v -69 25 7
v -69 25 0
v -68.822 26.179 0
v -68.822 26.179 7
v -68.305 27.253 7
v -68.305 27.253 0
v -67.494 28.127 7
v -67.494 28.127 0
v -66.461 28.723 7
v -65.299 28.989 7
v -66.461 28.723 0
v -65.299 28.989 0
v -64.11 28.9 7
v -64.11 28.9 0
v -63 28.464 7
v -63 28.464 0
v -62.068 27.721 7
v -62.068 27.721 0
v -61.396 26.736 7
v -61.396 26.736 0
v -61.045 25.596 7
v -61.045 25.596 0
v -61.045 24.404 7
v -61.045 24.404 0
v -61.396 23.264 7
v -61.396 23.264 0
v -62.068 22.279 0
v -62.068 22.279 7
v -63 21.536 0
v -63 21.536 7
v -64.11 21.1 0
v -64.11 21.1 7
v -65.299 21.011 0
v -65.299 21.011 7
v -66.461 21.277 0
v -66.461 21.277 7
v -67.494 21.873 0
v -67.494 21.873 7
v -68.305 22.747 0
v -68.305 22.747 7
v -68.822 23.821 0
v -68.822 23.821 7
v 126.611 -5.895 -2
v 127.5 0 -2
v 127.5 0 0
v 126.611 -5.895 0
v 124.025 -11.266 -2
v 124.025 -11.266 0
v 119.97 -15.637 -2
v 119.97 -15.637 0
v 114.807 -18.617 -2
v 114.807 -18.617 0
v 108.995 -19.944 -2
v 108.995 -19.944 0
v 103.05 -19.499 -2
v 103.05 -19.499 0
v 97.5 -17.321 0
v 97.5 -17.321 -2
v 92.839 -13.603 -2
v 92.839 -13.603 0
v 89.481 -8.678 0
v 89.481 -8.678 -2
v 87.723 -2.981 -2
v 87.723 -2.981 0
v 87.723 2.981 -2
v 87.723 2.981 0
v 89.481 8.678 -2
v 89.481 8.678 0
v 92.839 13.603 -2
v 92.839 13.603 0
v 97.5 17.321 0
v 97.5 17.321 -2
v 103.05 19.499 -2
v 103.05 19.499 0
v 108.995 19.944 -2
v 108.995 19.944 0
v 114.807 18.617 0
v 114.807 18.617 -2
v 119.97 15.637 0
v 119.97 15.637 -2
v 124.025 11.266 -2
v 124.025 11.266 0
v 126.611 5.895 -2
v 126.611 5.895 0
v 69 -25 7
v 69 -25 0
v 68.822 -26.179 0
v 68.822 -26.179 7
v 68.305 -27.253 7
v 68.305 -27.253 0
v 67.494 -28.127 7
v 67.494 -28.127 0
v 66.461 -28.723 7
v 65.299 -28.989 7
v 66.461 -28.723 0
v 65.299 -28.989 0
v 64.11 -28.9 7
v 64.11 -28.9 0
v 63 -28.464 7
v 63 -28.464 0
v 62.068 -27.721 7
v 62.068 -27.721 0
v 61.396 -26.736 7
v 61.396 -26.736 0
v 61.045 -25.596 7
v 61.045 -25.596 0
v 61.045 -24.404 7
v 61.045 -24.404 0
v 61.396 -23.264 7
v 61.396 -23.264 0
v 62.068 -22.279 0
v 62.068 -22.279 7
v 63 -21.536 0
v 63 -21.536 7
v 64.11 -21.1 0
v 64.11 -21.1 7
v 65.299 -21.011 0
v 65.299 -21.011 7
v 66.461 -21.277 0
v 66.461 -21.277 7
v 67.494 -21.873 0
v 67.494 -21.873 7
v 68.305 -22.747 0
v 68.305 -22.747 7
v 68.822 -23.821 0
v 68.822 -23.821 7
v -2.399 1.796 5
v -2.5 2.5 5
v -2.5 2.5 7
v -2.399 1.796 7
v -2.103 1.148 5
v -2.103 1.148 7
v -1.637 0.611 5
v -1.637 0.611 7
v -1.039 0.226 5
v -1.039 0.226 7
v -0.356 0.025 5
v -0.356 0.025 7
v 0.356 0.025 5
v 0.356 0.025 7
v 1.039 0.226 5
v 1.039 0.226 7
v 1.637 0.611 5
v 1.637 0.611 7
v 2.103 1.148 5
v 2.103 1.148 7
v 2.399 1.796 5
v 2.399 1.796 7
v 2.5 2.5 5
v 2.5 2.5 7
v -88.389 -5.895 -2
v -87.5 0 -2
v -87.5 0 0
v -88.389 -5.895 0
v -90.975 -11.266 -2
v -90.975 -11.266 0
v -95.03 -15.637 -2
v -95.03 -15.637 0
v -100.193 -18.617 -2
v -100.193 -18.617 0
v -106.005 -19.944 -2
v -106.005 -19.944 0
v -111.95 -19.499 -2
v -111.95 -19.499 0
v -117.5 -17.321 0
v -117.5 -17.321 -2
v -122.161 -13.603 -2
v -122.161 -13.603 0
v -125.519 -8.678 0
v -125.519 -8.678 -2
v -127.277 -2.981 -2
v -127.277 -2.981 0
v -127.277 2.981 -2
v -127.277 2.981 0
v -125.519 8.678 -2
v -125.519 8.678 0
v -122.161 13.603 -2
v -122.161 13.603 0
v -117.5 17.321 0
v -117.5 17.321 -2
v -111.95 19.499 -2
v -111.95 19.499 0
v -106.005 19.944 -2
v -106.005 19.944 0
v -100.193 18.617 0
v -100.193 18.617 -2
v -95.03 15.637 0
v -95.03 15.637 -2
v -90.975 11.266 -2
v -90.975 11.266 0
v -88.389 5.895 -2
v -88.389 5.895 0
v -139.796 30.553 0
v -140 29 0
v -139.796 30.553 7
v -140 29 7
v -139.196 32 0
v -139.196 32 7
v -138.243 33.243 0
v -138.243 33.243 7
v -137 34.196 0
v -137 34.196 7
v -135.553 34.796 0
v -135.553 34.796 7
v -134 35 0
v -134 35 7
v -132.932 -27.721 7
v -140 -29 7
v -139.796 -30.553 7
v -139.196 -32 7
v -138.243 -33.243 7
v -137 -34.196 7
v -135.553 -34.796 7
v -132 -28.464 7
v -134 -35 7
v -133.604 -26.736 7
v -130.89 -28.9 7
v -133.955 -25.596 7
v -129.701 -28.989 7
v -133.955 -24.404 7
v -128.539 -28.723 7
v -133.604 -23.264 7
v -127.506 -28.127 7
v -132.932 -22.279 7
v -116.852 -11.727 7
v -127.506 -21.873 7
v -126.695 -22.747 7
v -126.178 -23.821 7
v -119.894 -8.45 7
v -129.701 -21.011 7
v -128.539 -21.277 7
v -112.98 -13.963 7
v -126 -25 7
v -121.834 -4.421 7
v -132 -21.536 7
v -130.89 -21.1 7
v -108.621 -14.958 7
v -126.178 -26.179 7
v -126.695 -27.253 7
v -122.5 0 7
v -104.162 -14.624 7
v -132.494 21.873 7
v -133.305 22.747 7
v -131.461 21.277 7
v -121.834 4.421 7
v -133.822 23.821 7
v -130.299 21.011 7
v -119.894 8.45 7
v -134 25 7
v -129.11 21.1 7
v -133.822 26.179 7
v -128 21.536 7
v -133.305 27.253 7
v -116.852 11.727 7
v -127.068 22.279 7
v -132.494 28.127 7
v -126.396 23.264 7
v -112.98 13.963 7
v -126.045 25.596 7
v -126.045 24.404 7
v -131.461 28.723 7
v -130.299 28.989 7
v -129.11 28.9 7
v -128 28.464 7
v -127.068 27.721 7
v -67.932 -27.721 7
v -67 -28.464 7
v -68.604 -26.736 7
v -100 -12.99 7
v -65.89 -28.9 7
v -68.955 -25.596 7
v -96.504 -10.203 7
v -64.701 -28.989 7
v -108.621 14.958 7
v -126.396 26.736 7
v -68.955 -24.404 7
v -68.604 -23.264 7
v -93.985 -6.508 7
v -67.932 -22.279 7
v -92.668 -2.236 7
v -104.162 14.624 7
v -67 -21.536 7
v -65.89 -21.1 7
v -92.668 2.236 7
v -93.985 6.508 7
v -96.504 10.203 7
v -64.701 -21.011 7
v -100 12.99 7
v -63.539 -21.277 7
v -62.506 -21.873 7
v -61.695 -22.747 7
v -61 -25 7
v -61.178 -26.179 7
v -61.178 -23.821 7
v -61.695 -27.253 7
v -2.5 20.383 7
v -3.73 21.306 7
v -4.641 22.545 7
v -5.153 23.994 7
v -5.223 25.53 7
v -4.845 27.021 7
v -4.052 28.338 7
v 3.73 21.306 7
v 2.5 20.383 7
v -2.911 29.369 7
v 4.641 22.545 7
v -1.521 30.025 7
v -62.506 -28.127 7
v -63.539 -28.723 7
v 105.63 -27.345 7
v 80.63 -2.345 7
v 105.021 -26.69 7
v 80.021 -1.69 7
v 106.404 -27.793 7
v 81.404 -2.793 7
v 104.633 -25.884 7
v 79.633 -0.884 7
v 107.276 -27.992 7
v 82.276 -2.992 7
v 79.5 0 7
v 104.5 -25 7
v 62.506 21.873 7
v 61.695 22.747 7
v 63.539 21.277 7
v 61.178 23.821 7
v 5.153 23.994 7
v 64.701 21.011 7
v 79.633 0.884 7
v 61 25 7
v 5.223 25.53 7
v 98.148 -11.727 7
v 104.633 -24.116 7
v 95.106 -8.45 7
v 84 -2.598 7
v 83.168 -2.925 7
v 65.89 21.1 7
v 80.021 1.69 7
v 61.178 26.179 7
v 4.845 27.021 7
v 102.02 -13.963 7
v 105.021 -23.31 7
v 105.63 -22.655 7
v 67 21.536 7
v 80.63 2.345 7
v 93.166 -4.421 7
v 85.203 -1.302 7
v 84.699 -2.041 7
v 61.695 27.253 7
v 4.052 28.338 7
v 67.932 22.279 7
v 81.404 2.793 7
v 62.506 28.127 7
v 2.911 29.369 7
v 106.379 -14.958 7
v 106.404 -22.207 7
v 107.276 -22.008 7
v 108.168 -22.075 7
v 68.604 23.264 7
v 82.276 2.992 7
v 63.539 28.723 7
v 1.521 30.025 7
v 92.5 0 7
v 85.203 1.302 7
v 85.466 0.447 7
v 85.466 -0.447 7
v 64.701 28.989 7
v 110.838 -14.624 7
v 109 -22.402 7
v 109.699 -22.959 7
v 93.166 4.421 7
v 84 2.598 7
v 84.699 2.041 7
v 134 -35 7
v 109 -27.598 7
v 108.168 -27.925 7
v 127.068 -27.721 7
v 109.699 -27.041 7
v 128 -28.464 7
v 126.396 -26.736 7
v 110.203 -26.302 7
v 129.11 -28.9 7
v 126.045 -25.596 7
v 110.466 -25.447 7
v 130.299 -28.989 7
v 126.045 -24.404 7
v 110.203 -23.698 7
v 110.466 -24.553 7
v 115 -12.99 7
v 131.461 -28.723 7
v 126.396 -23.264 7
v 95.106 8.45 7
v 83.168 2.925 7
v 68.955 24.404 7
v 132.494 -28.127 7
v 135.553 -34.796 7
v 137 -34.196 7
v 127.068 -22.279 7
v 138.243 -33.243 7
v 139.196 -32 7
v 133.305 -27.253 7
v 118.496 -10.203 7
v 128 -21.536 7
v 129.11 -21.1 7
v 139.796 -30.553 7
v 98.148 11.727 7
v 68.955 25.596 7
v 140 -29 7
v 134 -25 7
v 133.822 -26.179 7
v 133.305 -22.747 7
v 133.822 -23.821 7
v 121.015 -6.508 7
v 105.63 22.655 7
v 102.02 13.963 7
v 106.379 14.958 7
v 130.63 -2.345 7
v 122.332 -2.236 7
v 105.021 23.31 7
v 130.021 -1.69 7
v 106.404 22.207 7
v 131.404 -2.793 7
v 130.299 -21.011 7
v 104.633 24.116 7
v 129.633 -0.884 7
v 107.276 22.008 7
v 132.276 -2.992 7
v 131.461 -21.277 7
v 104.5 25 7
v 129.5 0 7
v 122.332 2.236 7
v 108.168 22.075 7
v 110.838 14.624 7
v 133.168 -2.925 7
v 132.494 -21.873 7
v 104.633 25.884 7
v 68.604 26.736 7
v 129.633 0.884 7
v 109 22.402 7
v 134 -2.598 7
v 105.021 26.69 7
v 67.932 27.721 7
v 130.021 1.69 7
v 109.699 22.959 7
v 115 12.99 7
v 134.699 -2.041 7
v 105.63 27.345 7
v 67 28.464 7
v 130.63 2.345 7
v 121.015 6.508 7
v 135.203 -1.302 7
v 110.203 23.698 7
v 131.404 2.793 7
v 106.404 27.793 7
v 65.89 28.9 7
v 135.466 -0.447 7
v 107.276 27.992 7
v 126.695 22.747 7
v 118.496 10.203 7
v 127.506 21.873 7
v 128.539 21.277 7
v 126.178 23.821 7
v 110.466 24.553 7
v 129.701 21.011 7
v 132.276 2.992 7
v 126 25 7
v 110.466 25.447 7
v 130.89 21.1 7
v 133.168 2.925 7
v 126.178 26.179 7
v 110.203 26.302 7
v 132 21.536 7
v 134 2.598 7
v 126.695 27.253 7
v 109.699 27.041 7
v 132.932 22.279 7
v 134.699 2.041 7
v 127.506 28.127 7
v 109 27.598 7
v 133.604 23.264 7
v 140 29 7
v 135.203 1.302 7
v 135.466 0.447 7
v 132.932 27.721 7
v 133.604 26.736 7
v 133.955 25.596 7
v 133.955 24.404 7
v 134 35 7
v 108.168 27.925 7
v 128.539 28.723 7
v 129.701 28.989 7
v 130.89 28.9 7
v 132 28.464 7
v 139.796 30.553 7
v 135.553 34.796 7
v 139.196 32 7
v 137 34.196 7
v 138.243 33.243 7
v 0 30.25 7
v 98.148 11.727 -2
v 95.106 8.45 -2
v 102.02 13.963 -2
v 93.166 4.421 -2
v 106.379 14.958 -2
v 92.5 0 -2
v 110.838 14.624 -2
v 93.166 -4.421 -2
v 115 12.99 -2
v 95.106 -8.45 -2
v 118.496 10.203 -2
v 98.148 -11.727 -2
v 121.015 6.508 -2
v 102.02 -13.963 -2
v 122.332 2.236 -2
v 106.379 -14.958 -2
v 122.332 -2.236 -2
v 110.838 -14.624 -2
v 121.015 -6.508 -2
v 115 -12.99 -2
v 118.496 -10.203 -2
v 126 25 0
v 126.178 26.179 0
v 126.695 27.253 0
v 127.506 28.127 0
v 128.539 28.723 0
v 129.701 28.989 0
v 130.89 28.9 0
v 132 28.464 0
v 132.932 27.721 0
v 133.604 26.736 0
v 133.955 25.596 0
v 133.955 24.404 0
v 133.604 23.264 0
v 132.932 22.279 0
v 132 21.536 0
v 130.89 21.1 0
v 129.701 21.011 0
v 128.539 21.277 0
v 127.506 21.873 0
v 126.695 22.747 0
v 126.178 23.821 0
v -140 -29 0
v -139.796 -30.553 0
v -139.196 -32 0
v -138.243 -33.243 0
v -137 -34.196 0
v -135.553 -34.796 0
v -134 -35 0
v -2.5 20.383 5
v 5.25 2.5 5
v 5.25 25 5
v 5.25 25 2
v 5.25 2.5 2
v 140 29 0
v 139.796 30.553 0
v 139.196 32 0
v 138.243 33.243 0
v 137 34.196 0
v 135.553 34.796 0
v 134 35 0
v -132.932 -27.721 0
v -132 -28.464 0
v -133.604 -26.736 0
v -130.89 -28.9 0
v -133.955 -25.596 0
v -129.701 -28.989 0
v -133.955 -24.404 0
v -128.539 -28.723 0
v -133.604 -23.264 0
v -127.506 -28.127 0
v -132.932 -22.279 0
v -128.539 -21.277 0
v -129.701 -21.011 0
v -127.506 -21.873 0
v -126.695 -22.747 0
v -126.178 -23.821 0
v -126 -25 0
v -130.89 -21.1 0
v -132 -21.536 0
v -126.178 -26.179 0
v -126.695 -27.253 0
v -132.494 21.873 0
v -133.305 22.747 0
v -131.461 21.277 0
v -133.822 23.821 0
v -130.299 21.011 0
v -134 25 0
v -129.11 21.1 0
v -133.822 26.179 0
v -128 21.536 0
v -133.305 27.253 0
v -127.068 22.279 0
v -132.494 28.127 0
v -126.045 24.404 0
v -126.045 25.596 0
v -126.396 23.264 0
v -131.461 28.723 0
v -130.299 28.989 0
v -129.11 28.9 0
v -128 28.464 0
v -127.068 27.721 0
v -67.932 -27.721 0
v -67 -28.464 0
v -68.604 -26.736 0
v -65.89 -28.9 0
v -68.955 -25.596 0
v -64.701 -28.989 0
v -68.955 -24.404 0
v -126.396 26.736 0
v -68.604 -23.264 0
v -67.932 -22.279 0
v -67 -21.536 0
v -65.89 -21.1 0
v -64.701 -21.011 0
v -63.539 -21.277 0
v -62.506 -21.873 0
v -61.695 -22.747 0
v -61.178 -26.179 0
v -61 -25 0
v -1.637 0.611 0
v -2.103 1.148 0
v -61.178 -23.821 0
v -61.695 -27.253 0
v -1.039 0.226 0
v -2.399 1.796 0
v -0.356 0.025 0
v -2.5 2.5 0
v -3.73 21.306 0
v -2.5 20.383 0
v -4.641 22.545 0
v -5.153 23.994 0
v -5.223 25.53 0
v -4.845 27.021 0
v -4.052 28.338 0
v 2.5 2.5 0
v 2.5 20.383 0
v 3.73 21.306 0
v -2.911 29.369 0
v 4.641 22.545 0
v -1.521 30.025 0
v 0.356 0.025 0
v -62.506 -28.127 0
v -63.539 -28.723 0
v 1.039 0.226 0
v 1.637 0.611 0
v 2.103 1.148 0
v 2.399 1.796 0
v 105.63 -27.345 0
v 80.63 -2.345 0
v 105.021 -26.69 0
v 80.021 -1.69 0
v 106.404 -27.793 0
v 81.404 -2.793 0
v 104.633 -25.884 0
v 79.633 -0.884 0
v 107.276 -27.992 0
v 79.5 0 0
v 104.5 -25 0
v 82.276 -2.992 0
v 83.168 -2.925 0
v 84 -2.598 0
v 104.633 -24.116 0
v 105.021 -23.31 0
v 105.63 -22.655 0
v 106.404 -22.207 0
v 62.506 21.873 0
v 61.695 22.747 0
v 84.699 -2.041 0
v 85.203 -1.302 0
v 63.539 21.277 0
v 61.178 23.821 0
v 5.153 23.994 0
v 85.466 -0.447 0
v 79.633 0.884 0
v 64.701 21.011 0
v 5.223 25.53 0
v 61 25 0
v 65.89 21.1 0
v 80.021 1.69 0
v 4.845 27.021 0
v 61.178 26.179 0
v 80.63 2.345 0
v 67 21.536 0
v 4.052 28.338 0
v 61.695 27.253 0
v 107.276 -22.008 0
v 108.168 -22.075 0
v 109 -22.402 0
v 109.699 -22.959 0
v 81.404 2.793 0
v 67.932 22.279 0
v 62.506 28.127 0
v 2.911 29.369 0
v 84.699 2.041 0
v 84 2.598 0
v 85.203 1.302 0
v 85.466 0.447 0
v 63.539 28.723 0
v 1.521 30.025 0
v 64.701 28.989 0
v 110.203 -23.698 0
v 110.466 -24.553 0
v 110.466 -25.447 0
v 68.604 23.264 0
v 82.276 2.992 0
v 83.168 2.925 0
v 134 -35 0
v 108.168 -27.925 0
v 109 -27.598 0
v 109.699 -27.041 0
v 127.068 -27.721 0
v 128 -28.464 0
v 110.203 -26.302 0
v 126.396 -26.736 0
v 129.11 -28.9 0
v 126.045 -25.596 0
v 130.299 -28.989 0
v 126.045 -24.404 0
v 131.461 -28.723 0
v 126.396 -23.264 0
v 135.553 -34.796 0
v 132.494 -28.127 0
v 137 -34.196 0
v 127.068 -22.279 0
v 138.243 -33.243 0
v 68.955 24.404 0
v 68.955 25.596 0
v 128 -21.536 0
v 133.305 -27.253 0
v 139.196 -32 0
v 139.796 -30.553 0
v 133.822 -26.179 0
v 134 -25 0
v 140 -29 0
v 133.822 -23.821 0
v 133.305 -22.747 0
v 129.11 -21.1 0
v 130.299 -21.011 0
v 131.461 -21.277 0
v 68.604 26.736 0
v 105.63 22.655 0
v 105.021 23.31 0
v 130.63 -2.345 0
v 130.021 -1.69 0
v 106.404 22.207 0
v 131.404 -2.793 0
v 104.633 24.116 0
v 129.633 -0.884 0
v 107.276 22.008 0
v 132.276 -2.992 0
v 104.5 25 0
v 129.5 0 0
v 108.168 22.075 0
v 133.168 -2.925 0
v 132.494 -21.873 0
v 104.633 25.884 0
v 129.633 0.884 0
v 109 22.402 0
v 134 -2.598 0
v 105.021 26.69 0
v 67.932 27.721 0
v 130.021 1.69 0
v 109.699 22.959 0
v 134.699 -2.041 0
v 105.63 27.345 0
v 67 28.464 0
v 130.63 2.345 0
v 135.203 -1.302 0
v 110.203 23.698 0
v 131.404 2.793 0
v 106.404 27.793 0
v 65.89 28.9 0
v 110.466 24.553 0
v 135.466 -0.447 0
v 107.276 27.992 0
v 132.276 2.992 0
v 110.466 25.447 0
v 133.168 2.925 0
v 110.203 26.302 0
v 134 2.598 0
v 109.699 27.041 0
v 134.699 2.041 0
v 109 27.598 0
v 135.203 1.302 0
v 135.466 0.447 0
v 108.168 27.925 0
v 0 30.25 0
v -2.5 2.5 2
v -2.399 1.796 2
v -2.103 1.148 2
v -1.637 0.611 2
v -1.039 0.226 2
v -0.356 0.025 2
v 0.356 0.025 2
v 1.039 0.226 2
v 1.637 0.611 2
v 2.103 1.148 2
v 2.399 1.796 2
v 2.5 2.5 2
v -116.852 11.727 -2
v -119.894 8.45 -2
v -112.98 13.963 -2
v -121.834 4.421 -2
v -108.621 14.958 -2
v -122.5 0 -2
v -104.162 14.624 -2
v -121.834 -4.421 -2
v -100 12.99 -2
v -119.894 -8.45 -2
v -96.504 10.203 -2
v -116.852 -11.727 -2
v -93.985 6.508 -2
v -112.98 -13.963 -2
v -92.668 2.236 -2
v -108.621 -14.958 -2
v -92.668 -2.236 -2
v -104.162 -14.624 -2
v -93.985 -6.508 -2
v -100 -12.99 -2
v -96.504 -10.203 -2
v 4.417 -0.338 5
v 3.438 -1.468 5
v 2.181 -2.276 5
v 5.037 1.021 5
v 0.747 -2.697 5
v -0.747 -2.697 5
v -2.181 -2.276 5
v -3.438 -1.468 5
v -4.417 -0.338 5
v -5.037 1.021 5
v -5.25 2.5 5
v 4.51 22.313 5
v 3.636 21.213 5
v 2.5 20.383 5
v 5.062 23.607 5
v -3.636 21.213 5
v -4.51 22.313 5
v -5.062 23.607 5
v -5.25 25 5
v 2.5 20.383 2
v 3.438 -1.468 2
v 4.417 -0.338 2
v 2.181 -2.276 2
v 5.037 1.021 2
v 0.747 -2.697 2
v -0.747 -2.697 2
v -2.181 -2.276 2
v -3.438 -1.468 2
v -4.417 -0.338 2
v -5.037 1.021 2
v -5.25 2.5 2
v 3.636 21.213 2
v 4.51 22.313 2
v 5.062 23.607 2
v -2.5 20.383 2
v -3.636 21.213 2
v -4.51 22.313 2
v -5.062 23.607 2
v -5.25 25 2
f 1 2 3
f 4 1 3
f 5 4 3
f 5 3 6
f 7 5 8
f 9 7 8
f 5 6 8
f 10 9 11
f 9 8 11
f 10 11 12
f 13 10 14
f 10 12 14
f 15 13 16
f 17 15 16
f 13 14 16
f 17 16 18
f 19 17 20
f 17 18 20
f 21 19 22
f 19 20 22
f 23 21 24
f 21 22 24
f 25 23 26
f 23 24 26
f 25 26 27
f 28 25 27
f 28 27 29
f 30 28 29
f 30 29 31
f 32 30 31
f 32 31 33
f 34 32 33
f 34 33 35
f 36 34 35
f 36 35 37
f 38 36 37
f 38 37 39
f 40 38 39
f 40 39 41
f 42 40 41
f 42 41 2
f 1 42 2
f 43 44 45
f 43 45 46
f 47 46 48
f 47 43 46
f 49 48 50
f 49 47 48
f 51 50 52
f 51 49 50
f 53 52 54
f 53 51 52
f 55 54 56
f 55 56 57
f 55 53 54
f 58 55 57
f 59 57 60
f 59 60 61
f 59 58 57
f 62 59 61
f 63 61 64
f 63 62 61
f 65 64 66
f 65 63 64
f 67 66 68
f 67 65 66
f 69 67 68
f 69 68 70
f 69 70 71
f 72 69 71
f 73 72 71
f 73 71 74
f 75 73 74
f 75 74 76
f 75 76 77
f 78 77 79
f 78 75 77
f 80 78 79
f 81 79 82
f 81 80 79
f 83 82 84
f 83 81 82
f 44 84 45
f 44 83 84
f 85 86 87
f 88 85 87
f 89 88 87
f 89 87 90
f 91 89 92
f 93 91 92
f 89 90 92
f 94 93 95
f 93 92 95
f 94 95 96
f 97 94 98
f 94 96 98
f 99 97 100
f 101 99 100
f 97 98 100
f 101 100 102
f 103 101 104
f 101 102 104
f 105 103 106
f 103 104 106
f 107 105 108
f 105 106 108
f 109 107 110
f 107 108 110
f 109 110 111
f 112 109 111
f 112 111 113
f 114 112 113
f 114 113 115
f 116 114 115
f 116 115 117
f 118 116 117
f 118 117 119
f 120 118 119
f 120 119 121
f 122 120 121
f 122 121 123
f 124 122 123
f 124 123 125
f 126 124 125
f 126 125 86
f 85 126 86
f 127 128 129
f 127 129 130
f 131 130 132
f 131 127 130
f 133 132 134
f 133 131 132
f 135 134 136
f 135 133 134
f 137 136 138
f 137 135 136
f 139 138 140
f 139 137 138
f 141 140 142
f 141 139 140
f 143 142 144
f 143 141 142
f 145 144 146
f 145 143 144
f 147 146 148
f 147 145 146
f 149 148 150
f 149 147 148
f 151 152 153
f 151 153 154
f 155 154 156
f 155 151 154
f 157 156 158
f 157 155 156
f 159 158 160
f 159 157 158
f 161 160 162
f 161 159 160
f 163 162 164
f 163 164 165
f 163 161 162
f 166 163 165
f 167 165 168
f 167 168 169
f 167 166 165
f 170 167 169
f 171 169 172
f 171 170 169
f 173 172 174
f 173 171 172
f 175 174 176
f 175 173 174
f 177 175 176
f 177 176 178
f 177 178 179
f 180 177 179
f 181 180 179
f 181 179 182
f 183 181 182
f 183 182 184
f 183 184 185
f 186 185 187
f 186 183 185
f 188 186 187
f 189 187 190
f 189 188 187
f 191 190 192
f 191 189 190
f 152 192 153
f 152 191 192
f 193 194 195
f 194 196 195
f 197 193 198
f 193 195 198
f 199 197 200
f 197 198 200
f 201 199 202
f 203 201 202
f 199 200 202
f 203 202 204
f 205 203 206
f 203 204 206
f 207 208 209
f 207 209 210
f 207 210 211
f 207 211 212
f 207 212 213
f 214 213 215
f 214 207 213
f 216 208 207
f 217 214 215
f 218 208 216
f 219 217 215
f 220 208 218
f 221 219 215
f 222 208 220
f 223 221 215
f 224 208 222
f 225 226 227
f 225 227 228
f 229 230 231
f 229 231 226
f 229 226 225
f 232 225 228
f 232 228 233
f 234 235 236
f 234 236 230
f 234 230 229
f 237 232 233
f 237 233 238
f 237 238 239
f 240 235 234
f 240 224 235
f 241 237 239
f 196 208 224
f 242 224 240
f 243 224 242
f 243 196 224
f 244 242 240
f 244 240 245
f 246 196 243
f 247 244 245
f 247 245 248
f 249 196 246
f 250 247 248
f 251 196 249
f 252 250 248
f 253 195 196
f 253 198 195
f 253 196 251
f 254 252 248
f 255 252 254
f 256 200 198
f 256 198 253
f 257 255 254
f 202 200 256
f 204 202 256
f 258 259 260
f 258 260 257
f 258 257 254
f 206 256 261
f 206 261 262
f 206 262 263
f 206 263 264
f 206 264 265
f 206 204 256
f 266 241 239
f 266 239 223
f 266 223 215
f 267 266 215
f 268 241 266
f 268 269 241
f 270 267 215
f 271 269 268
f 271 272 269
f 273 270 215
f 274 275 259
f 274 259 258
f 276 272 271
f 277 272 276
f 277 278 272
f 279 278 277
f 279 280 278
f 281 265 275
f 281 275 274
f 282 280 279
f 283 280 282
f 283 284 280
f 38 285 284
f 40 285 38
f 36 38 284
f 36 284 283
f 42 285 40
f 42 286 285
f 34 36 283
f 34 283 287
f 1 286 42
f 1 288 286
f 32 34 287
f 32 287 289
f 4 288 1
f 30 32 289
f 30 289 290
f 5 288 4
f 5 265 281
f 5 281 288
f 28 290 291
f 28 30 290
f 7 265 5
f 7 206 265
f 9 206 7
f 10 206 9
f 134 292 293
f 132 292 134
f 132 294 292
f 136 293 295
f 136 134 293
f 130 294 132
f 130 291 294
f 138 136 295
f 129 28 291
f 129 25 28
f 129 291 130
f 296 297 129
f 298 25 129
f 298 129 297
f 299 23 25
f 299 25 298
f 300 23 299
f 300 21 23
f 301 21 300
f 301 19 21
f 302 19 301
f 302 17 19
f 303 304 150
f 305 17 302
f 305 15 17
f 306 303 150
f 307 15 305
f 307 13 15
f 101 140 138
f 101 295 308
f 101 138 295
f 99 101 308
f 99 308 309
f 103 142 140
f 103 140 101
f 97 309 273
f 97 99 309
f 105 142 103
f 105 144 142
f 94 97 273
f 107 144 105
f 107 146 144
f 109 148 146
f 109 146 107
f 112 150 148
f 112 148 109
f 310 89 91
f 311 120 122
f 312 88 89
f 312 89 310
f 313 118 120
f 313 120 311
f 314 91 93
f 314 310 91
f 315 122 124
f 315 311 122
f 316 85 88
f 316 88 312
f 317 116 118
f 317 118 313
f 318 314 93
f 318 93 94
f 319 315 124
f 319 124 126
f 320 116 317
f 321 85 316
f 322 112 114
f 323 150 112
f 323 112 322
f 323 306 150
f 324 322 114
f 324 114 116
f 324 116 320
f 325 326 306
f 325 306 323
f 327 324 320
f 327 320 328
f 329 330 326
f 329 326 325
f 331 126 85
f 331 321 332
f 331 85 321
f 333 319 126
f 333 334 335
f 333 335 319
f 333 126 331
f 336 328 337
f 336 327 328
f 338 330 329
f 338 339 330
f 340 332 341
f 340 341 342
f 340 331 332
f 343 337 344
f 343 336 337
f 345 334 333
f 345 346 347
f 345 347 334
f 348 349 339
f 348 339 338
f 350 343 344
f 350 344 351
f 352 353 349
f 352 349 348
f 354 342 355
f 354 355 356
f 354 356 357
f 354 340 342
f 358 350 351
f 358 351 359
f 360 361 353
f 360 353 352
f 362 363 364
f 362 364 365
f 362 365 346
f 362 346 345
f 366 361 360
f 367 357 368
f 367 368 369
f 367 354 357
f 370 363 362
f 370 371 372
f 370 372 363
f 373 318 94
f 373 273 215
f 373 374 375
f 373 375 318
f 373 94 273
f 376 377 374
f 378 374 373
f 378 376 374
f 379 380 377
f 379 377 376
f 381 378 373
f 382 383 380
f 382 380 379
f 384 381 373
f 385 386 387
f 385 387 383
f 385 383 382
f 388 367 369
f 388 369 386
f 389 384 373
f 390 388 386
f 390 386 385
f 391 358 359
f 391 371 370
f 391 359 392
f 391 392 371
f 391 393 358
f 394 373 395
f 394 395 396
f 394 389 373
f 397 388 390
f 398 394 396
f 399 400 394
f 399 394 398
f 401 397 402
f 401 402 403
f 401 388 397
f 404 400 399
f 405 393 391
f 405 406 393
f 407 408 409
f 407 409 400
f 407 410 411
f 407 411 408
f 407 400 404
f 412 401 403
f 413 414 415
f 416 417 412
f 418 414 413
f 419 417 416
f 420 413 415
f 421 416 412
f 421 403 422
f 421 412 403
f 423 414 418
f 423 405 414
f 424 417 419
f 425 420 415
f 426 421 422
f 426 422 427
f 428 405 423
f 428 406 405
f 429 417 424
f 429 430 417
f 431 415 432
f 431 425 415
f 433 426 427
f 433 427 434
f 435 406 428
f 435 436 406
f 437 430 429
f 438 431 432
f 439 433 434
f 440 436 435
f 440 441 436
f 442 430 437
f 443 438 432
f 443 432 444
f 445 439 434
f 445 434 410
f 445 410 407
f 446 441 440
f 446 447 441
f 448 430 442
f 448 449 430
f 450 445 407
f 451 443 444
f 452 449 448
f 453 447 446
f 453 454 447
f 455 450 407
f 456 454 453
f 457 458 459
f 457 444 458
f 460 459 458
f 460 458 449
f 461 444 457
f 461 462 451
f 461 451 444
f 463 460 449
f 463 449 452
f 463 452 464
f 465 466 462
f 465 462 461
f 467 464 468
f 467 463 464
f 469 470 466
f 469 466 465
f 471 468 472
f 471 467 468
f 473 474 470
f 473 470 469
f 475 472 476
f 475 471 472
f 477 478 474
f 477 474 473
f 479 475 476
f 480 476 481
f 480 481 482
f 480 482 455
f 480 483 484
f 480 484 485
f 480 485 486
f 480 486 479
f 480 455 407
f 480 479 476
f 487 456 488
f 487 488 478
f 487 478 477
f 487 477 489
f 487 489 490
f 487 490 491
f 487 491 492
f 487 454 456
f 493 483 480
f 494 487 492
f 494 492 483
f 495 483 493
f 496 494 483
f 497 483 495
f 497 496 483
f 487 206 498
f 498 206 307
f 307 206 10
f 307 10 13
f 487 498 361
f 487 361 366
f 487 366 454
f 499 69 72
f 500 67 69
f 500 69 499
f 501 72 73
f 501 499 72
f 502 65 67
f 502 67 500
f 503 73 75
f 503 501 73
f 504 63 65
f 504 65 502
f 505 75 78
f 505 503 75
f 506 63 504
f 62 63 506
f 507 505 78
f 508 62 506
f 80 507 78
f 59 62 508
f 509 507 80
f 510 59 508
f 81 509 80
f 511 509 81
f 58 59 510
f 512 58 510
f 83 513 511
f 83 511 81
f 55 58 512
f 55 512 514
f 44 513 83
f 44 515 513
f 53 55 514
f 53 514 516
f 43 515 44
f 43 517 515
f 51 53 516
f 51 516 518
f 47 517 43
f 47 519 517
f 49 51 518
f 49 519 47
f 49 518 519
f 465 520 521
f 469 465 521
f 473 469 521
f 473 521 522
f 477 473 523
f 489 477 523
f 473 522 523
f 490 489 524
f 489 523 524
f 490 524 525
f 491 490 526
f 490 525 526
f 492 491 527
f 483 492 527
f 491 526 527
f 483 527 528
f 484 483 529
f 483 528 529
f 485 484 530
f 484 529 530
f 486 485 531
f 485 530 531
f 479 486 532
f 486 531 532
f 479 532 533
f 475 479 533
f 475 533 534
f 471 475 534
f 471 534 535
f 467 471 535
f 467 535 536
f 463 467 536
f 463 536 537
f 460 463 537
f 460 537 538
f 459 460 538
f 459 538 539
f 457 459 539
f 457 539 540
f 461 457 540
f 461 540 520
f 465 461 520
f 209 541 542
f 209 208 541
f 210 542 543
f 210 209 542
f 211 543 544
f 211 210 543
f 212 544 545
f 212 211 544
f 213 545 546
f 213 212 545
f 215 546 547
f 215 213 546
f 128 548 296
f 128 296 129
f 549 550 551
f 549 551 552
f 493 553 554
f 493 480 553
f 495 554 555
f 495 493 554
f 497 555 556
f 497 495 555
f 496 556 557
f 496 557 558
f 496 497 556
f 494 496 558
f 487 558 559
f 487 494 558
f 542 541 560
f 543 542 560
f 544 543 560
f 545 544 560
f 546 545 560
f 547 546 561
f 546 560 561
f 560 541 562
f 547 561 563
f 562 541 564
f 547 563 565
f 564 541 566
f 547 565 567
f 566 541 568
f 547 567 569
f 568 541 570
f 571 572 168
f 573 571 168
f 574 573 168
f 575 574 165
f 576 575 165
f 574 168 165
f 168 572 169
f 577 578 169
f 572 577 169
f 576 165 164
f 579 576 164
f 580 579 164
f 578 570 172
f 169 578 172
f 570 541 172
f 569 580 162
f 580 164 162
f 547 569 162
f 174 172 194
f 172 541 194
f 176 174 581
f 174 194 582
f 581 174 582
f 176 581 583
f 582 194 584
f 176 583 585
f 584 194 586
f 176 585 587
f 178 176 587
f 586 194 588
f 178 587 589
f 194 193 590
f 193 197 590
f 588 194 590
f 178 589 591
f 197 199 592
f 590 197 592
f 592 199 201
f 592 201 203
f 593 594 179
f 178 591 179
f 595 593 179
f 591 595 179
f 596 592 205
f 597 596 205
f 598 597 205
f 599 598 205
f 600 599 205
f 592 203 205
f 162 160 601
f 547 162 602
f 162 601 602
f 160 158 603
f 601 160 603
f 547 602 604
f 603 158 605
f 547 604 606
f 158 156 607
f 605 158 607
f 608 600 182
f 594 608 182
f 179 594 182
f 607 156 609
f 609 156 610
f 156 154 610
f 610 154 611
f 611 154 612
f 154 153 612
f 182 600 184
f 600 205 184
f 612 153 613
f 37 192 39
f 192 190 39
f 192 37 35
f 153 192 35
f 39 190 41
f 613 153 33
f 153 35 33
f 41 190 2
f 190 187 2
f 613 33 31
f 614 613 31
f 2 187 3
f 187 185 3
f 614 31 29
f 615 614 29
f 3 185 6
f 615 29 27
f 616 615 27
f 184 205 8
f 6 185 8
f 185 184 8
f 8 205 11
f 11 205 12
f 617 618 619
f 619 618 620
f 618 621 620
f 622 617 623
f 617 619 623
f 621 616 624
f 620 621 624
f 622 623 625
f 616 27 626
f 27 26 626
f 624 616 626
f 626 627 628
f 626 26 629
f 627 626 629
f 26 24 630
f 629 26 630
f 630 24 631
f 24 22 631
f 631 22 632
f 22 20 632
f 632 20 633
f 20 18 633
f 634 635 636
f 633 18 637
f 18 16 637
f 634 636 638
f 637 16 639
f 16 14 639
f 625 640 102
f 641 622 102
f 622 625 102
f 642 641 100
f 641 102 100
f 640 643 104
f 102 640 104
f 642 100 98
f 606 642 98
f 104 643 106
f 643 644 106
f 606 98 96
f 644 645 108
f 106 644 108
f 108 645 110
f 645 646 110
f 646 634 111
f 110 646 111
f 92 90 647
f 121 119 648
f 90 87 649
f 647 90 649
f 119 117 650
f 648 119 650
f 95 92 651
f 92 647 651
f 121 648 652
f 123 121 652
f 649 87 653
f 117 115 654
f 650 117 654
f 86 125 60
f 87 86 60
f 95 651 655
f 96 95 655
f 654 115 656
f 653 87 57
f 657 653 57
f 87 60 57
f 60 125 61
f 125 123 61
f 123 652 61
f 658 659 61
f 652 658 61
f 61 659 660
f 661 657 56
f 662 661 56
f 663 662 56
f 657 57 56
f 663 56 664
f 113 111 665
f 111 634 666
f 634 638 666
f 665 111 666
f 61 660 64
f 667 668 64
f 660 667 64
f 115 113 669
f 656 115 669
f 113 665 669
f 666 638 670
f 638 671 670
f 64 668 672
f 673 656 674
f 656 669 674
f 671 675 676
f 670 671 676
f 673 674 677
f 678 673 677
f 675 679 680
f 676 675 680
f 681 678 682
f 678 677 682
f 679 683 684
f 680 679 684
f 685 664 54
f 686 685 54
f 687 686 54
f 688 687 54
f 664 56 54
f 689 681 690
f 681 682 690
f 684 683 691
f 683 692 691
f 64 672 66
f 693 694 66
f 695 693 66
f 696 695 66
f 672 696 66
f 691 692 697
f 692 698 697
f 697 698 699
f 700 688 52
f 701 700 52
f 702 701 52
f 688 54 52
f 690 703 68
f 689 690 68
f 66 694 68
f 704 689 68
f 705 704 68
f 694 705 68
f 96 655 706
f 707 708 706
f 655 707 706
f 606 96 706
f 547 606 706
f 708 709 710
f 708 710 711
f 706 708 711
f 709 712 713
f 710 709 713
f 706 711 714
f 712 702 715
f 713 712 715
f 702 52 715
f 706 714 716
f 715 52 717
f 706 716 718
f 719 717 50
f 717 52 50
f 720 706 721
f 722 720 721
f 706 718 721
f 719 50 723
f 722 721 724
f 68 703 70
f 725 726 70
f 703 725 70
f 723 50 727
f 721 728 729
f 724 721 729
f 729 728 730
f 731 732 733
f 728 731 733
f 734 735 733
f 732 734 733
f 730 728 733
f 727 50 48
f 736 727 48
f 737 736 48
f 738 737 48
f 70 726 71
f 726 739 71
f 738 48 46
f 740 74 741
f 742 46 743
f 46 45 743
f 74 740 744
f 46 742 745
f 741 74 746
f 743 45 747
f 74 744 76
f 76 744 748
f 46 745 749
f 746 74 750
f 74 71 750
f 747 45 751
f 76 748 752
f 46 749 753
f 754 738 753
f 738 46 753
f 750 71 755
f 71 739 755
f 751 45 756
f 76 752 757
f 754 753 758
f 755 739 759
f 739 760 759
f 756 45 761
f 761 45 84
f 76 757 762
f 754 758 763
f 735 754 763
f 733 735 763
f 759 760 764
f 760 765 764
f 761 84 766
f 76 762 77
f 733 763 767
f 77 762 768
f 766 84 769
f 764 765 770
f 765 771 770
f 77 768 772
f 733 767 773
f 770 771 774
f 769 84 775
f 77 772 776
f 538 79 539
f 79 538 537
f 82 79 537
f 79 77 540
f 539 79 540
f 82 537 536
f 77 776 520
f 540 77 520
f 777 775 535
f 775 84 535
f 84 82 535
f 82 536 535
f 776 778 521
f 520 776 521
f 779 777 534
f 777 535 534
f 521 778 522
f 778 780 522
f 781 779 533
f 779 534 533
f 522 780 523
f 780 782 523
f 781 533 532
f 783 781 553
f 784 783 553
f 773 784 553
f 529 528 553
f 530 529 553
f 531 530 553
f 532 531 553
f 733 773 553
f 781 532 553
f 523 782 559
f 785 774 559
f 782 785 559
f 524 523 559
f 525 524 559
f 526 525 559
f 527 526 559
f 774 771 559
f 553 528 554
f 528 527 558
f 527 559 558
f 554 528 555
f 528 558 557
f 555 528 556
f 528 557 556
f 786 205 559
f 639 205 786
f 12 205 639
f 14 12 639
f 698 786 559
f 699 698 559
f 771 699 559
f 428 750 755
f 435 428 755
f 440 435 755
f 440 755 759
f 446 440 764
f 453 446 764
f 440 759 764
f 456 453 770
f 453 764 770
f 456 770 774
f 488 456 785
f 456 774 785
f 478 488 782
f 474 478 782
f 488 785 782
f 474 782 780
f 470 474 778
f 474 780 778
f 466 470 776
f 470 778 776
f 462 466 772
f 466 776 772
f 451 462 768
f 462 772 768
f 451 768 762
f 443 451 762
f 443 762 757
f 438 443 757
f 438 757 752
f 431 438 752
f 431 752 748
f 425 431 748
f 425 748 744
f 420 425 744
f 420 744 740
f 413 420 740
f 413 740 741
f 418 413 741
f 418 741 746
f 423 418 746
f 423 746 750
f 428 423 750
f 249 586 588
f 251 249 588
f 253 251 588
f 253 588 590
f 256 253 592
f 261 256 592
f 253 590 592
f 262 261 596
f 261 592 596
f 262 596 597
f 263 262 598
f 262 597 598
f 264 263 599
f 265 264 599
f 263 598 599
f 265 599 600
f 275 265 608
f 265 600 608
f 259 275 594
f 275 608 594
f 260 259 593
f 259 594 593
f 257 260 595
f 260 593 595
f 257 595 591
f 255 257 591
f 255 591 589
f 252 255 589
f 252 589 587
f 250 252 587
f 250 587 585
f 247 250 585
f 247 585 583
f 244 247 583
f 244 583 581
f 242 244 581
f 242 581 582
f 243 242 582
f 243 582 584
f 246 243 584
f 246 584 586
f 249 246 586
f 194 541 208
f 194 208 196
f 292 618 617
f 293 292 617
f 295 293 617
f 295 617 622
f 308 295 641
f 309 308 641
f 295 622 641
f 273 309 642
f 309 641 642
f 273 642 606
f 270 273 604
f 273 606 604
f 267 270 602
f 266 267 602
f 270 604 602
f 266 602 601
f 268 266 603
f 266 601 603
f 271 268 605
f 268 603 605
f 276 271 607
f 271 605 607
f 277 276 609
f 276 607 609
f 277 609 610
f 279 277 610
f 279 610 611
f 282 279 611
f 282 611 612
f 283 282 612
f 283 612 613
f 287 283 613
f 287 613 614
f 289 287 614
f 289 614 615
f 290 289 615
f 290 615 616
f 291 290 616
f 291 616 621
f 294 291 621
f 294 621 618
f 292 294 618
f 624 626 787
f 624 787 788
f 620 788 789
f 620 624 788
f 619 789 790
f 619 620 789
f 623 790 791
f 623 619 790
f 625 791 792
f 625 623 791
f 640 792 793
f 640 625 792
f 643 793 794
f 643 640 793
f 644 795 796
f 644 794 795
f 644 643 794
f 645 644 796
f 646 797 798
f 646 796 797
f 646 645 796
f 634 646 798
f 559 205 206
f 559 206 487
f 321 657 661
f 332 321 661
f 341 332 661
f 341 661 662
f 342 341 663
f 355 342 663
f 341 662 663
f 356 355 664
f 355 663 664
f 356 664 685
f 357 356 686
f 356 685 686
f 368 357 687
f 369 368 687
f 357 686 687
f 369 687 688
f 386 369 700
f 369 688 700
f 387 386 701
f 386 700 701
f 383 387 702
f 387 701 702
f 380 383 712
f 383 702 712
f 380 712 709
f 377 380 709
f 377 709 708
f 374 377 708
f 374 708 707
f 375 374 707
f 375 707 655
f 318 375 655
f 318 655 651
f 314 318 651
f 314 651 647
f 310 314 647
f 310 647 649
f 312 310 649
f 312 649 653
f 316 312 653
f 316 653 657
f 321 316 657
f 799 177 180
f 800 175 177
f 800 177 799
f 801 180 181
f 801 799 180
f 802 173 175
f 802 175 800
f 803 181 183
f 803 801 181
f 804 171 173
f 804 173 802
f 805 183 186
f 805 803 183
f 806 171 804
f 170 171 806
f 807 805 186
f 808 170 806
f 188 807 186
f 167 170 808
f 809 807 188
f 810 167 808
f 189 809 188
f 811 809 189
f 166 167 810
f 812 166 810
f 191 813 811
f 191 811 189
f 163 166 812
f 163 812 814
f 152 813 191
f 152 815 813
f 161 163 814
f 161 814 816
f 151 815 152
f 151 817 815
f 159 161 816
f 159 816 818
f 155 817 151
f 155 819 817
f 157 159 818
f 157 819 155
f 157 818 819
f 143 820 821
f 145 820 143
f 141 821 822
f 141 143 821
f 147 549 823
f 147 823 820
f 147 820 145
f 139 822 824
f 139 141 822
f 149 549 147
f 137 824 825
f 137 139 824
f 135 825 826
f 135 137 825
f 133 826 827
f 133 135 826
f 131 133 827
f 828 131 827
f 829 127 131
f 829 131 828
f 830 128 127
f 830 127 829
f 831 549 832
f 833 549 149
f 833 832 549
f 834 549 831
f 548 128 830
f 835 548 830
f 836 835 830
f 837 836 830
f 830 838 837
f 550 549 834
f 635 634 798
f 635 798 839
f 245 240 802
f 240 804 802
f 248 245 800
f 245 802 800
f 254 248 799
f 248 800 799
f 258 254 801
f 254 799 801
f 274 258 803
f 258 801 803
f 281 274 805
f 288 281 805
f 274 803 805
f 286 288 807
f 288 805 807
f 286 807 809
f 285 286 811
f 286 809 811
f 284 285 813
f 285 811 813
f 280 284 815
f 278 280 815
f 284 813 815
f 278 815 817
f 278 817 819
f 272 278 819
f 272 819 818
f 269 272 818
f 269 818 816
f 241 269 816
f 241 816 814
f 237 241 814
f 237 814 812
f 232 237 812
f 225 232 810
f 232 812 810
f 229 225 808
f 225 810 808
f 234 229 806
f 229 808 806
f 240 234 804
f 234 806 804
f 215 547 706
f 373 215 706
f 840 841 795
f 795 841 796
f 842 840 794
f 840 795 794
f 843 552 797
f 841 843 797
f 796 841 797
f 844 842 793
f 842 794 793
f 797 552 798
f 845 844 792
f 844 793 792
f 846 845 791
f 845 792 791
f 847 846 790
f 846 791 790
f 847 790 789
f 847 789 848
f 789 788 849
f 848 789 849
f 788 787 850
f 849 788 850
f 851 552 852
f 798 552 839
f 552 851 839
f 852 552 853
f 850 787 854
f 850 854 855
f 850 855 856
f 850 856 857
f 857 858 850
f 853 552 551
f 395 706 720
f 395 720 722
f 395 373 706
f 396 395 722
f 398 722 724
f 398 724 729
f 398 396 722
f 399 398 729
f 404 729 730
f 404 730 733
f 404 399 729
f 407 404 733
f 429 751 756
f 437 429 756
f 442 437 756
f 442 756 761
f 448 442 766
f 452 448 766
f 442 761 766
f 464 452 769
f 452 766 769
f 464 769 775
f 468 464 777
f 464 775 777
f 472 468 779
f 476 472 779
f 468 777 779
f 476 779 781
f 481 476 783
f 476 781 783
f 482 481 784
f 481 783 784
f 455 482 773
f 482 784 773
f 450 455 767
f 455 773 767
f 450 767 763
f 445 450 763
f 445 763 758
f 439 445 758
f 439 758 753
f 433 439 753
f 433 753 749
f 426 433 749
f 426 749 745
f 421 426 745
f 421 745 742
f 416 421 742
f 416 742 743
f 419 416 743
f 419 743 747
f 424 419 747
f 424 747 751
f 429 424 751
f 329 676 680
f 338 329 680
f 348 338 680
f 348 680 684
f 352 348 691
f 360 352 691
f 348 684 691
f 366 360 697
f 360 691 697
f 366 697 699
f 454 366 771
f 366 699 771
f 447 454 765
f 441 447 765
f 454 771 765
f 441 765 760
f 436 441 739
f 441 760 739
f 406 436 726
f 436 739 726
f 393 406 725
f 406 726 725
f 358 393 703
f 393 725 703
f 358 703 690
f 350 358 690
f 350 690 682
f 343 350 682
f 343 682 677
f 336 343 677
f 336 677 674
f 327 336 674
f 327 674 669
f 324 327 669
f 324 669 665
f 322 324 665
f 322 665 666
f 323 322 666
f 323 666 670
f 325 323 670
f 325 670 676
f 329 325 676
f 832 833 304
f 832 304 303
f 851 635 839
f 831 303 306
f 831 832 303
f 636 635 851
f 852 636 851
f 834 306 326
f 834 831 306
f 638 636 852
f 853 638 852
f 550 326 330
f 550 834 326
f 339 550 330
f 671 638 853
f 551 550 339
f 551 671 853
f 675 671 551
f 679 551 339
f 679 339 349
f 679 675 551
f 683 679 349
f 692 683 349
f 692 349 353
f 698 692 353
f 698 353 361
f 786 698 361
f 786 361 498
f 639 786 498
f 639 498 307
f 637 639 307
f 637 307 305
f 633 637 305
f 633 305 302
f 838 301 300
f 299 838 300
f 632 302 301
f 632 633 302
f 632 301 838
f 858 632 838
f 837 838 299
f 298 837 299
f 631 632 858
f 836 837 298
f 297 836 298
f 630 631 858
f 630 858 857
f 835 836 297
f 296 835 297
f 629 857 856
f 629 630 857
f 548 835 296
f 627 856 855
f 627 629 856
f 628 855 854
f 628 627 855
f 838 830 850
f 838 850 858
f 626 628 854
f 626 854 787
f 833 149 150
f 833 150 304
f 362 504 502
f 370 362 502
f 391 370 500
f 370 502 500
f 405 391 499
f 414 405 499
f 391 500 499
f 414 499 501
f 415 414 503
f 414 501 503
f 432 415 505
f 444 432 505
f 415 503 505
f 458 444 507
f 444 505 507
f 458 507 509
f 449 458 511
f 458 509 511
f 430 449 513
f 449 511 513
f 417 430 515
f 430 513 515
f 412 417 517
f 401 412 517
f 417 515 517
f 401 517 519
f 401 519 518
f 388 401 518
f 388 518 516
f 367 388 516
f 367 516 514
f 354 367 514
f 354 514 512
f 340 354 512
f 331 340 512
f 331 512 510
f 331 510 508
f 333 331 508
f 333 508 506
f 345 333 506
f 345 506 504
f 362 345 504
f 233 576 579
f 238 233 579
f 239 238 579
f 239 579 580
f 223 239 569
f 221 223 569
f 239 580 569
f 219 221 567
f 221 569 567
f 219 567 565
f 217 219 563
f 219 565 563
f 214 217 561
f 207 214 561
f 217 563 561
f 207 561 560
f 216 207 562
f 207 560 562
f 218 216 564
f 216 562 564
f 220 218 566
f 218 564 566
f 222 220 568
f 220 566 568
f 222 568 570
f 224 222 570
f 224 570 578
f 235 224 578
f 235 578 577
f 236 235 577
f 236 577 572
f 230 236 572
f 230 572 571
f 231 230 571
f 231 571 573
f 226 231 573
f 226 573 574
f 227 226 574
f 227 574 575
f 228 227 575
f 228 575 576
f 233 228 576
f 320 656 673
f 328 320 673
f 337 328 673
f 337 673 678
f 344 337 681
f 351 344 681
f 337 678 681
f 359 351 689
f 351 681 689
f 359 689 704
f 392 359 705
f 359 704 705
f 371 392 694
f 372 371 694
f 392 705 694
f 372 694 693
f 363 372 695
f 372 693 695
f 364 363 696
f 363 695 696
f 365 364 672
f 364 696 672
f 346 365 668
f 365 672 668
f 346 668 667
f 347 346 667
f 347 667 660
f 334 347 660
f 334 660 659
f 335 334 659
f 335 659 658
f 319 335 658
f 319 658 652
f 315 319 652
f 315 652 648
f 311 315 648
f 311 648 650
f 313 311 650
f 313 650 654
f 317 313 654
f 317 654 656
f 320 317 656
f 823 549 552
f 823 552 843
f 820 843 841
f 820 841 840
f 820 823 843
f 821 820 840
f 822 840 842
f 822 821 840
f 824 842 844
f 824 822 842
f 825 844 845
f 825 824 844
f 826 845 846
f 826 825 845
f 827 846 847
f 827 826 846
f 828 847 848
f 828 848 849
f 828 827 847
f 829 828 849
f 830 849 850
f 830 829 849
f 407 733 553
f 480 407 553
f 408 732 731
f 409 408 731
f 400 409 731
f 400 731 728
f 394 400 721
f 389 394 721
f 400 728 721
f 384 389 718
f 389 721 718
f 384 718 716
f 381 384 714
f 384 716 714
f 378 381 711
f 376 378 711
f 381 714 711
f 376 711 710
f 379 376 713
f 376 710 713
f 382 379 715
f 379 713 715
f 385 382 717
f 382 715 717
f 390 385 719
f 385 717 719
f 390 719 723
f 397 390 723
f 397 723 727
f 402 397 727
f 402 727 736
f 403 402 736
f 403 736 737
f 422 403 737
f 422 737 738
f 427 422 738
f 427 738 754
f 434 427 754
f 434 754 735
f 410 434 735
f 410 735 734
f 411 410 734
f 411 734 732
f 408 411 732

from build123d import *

# Parameters (mm, degrees)
SKETCH1_W           = 280
SKETCH1_H           = 70
BOSS_EXTRUDE1_DEPTH = 7
FILLET1_R           = 6
SKETCH2_R           = 15
SKETCH2_R_2         = 4
SKETCH2_R_3         = 3
CUT_EXTRUDE1_DEPTH  = 10
BOSS_EXTRUDE2_START = 2
SKETCH3_R           = 20
SKETCH3_R_2         = 15
BOSS_EXTRUDE2_DEPTH = 2
CUT_EXTRUDE2_DEPTH  = 3


with BuildPart() as part:
    # Sketch1 → Boss-Extrude1 (new body)
    with BuildSketch(Plane.XY):
        Rectangle(SKETCH1_W, SKETCH1_H)
    extrude(amount=BOSS_EXTRUDE1_DEPTH)

    # Fillet1
    fillet1_edges = [part.edges().sort_by_distance(p)[0] for p in [
        (140, -35, 3.5),
        (-140, -35, 3.5),
        (-140, 35, 3.5),
        (140, 35, 3.5),
    ]]
    fillet(fillet1_edges, radius=FILLET1_R)

    # Sketch2 → Cut-Extrude1 (cut)
    with BuildSketch(Plane(origin=(0, 0, 0), x_dir=(-1, 0, 0), z_dir=(0, 0, -1))):
        with Locations((-107.5, 0)):
            Circle(SKETCH2_R)
        with Locations((107.5, 0)):
            Circle(SKETCH2_R)
        with Locations((130, 25)):
            Circle(SKETCH2_R_2)
        with Locations((65, 25)):
            Circle(SKETCH2_R_2)
        with Locations((-65, 25)):
            Circle(SKETCH2_R_2)
        with Locations((-130, 25)):
            Circle(SKETCH2_R_2)
        with Locations(Location((-130, -25, 0), (0, 0, 180))):
            Circle(SKETCH2_R_2)
        with Locations(Location((-65, -25, 0), (0, 0, 180))):
            Circle(SKETCH2_R_2)
        with Locations(Location((65, -25, 0), (0, 0, 180))):
            Circle(SKETCH2_R_2)
        with Locations(Location((130, -25, 0), (0, 0, 180))):
            Circle(SKETCH2_R_2)
        with Locations((-132.5, 0)):
            Circle(SKETCH2_R_3)
        with Locations((-107.5, 25)):
            Circle(SKETCH2_R_3)
        with Locations((-107.5, -25)):
            Circle(SKETCH2_R_3)
        with Locations((-82.5, 0)):
            Circle(SKETCH2_R_3)
        with BuildLine():
            Line((2.5, 20.383453672), (2.5, 2.5))
            ThreePointArc((2.5, 2.5), (0, 0), (-2.5, 2.5))
            Line((-2.5, 2.5), (-2.5, 20.383453672))
            ThreePointArc((-2.5, 20.383453672), (0, 30.25), (2.5, 20.383453672))
        make_face()
    extrude(amount=-CUT_EXTRUDE1_DEPTH, mode=Mode.SUBTRACT)

    # Sketch3 → Boss-Extrude2 (add)
    # profile 1 of 2: a face of its own
    with BuildSketch(Plane(origin=(0, 0, 0), x_dir=(-1, 0, 0), z_dir=(0, 0, -1)).offset(BOSS_EXTRUDE2_START)):
        with Locations(Location((-107.5, 0, 0), (0, 0, 180))):
            Circle(SKETCH3_R)
        with Locations((-107.5, 0)):
            Circle(SKETCH3_R_2, mode=Mode.SUBTRACT)
    # profile 2 of 2: a face of its own
    with BuildSketch(Plane(origin=(0, 0, 0), x_dir=(-1, 0, 0), z_dir=(0, 0, -1)).offset(BOSS_EXTRUDE2_START)):
        with Locations(Location((107.5, 0, 0), (0, 0, 180))):
            Circle(SKETCH3_R)
        with Locations((107.5, 0)):
            Circle(SKETCH3_R_2, mode=Mode.SUBTRACT)
    extrude(amount=-BOSS_EXTRUDE2_DEPTH)

    # Sketch4 → Cut-Extrude2 (cut)
    with BuildSketch(Plane.XY.offset(5)):
        with BuildLine():
            Line((-5.25, 20.383453672), (-5.25, 25))
            Line((-5.25, 25), (0, 25))
            Line((0, 25), (5.25, 25))
            Line((5.25, 25), (5.25, 20.383453672))
            Line((5.25, 20.383453672), (5.25, 2.5))
            ThreePointArc((5.25, 2.5), (0, -2.75), (-5.25, 2.5))
            Line((-5.25, 2.5), (-5.25, 20.383453672))
        make_face()
    extrude(amount=-CUT_EXTRUDE2_DEPTH, mode=Mode.SUBTRACT)


solid = part.part
